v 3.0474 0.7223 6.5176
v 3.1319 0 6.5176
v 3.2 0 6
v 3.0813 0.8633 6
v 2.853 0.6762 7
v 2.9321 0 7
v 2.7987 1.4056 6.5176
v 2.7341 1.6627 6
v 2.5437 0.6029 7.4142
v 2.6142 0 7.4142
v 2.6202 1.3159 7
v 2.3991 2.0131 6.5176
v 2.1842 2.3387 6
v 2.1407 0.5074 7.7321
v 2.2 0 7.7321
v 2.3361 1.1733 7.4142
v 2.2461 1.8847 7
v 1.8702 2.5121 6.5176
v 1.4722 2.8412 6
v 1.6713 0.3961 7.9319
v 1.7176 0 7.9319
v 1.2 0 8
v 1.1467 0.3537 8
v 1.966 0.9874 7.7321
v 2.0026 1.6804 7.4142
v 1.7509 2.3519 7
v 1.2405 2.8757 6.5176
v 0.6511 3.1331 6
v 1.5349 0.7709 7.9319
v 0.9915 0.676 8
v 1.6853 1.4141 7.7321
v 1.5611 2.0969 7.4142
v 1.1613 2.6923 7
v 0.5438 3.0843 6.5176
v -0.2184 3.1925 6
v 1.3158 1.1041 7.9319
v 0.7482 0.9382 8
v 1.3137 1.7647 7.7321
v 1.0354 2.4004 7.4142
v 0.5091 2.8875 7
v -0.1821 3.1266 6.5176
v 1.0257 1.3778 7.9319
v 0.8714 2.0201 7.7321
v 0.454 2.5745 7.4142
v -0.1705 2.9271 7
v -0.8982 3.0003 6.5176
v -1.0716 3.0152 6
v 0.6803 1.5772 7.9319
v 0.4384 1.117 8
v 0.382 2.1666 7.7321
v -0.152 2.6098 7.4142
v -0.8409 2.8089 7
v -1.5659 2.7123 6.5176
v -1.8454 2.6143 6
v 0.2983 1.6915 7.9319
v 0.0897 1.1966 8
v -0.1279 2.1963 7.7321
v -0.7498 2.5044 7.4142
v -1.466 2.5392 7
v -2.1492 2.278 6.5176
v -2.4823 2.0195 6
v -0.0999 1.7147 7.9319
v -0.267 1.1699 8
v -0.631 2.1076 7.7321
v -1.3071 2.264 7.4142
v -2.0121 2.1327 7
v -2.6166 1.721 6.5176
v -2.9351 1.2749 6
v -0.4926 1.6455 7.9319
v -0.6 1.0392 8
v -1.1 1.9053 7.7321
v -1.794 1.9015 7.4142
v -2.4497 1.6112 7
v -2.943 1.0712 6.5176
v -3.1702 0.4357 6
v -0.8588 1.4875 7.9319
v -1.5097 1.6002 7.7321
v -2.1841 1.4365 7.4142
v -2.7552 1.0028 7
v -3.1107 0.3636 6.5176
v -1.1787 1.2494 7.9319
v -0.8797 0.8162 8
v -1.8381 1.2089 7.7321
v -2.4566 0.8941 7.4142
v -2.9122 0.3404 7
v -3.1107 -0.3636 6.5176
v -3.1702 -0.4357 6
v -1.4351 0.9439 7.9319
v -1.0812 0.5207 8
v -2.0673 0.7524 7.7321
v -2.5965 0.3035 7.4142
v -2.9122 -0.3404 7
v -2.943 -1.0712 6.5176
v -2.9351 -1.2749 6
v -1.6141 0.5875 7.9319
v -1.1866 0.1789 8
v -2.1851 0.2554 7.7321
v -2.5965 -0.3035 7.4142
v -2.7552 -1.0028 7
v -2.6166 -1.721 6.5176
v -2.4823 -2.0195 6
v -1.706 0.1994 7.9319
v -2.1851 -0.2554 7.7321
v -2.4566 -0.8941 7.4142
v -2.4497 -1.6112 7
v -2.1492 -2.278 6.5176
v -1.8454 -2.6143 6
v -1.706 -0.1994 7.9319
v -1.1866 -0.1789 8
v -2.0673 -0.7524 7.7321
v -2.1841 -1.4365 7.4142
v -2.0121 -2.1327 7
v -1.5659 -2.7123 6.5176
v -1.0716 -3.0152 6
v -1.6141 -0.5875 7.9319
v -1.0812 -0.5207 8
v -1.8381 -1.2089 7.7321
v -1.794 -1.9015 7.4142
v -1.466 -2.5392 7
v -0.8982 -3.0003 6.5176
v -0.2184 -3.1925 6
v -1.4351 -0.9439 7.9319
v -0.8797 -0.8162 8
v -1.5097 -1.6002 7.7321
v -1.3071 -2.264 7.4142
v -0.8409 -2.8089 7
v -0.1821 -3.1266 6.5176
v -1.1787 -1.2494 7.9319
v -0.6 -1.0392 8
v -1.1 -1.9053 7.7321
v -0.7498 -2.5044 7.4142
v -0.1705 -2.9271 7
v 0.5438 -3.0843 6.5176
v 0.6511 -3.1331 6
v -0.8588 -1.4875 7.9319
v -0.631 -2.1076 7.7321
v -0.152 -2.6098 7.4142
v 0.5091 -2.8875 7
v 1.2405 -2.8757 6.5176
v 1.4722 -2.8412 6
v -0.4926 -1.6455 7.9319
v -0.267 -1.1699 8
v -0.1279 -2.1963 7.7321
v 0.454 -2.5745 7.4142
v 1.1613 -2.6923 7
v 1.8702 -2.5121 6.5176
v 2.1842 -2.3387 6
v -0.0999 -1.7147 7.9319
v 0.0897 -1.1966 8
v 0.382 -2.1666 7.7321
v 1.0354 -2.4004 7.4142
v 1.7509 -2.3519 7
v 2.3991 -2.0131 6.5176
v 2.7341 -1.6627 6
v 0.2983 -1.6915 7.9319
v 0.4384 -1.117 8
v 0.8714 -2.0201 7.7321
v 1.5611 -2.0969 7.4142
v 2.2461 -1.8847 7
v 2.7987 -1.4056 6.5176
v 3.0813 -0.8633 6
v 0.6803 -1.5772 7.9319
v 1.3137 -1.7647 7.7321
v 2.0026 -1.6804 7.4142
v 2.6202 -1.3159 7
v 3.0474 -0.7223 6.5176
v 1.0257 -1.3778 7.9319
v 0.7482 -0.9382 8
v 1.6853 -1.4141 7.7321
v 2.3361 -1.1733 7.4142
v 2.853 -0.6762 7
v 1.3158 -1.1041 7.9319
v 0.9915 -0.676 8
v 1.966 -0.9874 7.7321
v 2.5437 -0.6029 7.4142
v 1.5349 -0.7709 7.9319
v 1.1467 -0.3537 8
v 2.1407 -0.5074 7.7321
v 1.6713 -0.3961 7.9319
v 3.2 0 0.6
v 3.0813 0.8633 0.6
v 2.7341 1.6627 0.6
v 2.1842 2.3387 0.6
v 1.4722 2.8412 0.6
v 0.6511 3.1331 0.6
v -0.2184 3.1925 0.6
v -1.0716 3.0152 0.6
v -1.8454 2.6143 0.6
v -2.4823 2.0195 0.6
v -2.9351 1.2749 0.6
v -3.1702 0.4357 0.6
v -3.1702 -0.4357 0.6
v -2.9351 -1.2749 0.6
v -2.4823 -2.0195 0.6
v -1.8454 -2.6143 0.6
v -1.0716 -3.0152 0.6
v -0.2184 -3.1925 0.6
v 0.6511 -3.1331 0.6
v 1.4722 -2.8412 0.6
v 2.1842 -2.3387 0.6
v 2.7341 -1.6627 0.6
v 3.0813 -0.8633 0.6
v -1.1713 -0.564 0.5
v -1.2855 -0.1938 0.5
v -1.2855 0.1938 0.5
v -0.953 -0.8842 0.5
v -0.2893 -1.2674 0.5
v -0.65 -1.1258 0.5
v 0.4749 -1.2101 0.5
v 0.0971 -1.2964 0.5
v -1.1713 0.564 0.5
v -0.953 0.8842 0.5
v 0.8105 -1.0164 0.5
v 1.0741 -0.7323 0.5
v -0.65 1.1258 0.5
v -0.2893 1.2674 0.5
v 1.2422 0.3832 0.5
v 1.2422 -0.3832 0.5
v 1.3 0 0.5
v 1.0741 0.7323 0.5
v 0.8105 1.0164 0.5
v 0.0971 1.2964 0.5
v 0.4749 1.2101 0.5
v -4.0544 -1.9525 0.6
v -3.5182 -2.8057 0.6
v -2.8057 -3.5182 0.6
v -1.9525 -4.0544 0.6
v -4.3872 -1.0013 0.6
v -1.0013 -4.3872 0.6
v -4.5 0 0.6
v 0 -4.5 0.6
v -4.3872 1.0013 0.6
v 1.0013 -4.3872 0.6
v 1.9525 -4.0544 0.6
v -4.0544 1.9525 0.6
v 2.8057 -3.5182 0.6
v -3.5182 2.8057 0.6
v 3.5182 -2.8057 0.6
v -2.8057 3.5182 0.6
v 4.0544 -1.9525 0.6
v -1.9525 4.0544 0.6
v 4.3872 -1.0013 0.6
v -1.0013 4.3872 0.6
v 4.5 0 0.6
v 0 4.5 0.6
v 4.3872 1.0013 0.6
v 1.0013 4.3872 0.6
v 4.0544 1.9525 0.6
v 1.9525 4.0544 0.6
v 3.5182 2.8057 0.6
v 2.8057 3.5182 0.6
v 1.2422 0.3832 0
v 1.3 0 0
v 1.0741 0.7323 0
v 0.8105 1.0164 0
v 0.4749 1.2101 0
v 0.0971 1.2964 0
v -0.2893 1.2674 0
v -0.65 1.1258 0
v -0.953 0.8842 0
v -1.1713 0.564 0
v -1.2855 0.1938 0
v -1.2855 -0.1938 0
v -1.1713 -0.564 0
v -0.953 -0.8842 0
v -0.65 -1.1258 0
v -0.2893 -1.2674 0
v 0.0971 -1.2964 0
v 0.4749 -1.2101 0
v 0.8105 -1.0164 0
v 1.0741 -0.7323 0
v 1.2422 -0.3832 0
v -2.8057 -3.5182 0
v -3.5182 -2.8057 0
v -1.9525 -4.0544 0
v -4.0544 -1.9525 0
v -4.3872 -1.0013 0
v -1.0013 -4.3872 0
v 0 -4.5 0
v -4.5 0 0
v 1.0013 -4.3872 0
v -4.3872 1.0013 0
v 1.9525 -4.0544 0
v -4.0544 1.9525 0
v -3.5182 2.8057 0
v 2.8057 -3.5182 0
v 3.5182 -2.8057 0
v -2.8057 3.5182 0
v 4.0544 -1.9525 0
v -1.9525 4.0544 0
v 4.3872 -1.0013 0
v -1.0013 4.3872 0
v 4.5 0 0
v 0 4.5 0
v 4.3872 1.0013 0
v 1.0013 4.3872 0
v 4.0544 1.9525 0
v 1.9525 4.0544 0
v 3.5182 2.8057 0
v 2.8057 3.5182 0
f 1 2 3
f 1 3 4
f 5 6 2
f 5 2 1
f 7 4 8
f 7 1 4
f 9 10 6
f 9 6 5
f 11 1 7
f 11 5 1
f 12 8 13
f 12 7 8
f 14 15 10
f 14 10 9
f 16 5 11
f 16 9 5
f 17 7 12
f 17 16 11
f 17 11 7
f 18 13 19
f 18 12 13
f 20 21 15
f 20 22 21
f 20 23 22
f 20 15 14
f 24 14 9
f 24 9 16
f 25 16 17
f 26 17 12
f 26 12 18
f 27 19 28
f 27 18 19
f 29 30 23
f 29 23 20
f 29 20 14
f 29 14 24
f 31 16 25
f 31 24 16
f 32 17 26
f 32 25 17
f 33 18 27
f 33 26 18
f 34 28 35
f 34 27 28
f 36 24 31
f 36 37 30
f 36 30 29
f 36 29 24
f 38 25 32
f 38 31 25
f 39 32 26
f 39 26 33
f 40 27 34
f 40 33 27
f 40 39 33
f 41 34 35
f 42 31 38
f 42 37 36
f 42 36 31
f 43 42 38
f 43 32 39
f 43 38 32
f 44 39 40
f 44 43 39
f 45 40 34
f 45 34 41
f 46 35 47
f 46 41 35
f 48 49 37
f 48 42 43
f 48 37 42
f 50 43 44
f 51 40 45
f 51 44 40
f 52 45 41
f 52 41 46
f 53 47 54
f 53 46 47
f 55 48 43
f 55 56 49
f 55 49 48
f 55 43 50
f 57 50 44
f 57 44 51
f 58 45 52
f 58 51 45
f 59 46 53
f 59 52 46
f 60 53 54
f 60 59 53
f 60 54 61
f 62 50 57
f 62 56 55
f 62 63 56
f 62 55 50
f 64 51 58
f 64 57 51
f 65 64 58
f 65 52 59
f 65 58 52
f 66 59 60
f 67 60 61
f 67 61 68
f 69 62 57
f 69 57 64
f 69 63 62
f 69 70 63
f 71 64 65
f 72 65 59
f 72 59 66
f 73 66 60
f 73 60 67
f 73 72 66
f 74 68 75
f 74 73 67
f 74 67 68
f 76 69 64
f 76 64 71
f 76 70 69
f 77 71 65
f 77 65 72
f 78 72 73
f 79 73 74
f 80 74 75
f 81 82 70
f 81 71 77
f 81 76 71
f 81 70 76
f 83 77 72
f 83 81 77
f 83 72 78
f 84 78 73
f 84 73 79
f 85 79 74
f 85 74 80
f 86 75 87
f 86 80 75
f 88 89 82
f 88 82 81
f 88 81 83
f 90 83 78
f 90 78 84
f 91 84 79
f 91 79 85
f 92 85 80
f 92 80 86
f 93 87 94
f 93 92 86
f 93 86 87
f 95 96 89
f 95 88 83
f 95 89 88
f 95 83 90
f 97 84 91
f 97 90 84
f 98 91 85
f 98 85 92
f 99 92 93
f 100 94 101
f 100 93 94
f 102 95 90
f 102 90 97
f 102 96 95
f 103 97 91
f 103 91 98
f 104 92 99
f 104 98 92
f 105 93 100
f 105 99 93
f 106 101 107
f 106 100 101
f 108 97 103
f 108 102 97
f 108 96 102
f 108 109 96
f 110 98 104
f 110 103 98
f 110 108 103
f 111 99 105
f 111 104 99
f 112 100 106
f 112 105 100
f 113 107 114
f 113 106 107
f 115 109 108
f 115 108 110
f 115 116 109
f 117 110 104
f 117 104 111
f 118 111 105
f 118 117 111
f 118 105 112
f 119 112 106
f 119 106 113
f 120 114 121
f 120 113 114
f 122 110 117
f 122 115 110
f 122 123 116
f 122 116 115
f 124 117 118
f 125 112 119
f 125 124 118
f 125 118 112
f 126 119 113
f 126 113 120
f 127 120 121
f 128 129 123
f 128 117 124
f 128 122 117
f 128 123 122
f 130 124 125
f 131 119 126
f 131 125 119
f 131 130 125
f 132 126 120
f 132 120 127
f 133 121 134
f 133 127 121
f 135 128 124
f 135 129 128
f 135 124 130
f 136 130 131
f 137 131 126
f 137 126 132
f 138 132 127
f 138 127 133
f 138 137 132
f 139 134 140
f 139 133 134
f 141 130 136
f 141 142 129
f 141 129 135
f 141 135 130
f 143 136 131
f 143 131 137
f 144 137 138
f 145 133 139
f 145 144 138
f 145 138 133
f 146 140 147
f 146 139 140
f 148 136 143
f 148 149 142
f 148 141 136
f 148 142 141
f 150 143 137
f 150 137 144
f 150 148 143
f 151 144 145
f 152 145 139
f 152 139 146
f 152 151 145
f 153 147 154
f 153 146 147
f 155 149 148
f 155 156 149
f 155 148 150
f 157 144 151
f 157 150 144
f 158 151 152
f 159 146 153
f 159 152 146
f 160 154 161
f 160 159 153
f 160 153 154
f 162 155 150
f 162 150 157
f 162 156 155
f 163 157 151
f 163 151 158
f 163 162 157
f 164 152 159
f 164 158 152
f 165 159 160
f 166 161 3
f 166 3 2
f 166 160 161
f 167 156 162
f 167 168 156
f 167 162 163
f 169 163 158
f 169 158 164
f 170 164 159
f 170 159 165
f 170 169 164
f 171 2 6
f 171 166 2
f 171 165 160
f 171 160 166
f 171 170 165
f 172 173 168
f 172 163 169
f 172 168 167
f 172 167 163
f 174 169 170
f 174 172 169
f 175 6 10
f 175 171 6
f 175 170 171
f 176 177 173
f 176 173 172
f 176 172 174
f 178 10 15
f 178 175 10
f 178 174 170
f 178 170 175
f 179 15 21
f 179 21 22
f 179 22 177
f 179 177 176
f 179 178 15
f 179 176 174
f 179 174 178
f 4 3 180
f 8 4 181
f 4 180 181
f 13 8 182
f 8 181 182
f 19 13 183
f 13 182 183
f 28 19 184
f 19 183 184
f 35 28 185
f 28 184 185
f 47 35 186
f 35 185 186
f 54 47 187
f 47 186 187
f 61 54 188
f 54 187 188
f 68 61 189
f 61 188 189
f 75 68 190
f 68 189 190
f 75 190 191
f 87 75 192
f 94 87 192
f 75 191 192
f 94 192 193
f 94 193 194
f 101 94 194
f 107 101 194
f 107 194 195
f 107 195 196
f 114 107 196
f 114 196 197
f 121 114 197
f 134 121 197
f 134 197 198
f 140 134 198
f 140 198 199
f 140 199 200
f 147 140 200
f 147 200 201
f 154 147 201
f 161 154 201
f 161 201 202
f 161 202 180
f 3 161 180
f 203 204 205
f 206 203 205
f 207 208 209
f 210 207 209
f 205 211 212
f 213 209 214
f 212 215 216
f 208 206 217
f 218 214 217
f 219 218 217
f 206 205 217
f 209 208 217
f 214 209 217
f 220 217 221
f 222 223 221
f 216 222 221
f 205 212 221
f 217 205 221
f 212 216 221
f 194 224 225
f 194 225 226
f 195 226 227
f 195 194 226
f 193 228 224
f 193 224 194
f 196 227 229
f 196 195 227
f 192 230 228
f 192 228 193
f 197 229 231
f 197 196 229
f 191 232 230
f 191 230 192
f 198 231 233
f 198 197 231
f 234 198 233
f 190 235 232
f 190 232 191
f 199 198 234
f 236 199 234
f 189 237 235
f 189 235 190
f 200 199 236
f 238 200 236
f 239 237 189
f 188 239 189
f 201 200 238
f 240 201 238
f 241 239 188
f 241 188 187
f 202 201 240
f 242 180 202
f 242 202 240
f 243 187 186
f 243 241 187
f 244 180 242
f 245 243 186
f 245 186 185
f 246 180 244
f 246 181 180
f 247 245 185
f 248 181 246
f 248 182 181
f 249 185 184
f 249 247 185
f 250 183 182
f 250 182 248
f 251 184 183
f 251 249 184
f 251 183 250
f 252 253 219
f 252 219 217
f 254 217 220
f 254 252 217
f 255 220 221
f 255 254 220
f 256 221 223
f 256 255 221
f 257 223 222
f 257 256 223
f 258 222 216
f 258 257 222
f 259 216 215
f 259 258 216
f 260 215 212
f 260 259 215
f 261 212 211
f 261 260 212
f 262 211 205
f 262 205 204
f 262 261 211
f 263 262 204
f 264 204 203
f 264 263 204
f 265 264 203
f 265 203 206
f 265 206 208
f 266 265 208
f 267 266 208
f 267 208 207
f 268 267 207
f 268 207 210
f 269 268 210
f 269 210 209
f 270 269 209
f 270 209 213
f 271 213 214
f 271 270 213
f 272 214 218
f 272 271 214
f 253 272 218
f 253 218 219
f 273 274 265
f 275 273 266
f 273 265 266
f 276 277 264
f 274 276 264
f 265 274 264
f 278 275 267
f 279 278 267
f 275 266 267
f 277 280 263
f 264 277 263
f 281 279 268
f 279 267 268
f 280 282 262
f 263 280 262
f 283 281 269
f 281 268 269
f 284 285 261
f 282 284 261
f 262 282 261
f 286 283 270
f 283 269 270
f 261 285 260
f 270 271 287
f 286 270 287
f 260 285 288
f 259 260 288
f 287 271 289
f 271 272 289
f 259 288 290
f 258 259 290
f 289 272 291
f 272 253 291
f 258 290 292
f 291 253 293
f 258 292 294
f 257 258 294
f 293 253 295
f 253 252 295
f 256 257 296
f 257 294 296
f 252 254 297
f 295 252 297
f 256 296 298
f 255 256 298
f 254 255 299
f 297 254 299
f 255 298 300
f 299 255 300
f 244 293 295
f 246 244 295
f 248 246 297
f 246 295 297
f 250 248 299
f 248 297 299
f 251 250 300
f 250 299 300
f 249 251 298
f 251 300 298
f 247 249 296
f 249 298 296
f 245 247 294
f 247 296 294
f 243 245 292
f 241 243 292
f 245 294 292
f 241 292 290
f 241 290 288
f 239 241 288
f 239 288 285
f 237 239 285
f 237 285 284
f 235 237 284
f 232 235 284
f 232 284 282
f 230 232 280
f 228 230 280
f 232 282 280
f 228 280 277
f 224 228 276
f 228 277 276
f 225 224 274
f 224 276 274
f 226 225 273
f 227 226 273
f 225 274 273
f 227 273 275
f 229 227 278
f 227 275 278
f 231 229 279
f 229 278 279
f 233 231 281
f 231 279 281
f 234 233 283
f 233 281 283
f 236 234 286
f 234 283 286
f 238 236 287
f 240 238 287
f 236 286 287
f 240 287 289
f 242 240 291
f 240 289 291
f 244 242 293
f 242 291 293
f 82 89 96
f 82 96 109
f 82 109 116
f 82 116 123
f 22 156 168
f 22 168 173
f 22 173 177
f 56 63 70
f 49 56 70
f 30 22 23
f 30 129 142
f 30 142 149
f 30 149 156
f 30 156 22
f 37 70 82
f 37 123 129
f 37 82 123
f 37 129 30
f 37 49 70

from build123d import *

# Parameters (mm, degrees)
F0_R     = 4.5
F0_R_2   = 3.2
F0_R_3   = 1.3
F1_DEPTH = 0.6
F2_DEPTH = 8
F3_R     = 2
F4_DEPTH = 0.5


with BuildPart() as f1:
    # F0 (on Top) → F1 (new body)
    with BuildSketch(Plane.XY):
        Circle(F0_R)
        Circle(F0_R_2, mode=Mode.SUBTRACT)
        Circle(F0_R_2)
        Circle(F0_R_3, mode=Mode.SUBTRACT)
    extrude(amount=F1_DEPTH)

    # F0 (on Top) → F2 (join)
    with BuildSketch(Plane.XY):
        Circle(F0_R_2)
        Circle(F0_R_3, mode=Mode.SUBTRACT)
        Circle(F0_R_3)
    extrude(amount=F2_DEPTH)

    # F3
    f3_edges = [f1.edges().sort_by_distance(p)[0] for p in [
        (-3.2, 0, 8),
    ]]
    fillet(f3_edges, radius=F3_R)

    # F0 (on Top) → F4 (cut)
    with BuildSketch(Plane.XY):
        Circle(F0_R_3)
    extrude(amount=F4_DEPTH, mode=Mode.SUBTRACT)


solid = f1.part
